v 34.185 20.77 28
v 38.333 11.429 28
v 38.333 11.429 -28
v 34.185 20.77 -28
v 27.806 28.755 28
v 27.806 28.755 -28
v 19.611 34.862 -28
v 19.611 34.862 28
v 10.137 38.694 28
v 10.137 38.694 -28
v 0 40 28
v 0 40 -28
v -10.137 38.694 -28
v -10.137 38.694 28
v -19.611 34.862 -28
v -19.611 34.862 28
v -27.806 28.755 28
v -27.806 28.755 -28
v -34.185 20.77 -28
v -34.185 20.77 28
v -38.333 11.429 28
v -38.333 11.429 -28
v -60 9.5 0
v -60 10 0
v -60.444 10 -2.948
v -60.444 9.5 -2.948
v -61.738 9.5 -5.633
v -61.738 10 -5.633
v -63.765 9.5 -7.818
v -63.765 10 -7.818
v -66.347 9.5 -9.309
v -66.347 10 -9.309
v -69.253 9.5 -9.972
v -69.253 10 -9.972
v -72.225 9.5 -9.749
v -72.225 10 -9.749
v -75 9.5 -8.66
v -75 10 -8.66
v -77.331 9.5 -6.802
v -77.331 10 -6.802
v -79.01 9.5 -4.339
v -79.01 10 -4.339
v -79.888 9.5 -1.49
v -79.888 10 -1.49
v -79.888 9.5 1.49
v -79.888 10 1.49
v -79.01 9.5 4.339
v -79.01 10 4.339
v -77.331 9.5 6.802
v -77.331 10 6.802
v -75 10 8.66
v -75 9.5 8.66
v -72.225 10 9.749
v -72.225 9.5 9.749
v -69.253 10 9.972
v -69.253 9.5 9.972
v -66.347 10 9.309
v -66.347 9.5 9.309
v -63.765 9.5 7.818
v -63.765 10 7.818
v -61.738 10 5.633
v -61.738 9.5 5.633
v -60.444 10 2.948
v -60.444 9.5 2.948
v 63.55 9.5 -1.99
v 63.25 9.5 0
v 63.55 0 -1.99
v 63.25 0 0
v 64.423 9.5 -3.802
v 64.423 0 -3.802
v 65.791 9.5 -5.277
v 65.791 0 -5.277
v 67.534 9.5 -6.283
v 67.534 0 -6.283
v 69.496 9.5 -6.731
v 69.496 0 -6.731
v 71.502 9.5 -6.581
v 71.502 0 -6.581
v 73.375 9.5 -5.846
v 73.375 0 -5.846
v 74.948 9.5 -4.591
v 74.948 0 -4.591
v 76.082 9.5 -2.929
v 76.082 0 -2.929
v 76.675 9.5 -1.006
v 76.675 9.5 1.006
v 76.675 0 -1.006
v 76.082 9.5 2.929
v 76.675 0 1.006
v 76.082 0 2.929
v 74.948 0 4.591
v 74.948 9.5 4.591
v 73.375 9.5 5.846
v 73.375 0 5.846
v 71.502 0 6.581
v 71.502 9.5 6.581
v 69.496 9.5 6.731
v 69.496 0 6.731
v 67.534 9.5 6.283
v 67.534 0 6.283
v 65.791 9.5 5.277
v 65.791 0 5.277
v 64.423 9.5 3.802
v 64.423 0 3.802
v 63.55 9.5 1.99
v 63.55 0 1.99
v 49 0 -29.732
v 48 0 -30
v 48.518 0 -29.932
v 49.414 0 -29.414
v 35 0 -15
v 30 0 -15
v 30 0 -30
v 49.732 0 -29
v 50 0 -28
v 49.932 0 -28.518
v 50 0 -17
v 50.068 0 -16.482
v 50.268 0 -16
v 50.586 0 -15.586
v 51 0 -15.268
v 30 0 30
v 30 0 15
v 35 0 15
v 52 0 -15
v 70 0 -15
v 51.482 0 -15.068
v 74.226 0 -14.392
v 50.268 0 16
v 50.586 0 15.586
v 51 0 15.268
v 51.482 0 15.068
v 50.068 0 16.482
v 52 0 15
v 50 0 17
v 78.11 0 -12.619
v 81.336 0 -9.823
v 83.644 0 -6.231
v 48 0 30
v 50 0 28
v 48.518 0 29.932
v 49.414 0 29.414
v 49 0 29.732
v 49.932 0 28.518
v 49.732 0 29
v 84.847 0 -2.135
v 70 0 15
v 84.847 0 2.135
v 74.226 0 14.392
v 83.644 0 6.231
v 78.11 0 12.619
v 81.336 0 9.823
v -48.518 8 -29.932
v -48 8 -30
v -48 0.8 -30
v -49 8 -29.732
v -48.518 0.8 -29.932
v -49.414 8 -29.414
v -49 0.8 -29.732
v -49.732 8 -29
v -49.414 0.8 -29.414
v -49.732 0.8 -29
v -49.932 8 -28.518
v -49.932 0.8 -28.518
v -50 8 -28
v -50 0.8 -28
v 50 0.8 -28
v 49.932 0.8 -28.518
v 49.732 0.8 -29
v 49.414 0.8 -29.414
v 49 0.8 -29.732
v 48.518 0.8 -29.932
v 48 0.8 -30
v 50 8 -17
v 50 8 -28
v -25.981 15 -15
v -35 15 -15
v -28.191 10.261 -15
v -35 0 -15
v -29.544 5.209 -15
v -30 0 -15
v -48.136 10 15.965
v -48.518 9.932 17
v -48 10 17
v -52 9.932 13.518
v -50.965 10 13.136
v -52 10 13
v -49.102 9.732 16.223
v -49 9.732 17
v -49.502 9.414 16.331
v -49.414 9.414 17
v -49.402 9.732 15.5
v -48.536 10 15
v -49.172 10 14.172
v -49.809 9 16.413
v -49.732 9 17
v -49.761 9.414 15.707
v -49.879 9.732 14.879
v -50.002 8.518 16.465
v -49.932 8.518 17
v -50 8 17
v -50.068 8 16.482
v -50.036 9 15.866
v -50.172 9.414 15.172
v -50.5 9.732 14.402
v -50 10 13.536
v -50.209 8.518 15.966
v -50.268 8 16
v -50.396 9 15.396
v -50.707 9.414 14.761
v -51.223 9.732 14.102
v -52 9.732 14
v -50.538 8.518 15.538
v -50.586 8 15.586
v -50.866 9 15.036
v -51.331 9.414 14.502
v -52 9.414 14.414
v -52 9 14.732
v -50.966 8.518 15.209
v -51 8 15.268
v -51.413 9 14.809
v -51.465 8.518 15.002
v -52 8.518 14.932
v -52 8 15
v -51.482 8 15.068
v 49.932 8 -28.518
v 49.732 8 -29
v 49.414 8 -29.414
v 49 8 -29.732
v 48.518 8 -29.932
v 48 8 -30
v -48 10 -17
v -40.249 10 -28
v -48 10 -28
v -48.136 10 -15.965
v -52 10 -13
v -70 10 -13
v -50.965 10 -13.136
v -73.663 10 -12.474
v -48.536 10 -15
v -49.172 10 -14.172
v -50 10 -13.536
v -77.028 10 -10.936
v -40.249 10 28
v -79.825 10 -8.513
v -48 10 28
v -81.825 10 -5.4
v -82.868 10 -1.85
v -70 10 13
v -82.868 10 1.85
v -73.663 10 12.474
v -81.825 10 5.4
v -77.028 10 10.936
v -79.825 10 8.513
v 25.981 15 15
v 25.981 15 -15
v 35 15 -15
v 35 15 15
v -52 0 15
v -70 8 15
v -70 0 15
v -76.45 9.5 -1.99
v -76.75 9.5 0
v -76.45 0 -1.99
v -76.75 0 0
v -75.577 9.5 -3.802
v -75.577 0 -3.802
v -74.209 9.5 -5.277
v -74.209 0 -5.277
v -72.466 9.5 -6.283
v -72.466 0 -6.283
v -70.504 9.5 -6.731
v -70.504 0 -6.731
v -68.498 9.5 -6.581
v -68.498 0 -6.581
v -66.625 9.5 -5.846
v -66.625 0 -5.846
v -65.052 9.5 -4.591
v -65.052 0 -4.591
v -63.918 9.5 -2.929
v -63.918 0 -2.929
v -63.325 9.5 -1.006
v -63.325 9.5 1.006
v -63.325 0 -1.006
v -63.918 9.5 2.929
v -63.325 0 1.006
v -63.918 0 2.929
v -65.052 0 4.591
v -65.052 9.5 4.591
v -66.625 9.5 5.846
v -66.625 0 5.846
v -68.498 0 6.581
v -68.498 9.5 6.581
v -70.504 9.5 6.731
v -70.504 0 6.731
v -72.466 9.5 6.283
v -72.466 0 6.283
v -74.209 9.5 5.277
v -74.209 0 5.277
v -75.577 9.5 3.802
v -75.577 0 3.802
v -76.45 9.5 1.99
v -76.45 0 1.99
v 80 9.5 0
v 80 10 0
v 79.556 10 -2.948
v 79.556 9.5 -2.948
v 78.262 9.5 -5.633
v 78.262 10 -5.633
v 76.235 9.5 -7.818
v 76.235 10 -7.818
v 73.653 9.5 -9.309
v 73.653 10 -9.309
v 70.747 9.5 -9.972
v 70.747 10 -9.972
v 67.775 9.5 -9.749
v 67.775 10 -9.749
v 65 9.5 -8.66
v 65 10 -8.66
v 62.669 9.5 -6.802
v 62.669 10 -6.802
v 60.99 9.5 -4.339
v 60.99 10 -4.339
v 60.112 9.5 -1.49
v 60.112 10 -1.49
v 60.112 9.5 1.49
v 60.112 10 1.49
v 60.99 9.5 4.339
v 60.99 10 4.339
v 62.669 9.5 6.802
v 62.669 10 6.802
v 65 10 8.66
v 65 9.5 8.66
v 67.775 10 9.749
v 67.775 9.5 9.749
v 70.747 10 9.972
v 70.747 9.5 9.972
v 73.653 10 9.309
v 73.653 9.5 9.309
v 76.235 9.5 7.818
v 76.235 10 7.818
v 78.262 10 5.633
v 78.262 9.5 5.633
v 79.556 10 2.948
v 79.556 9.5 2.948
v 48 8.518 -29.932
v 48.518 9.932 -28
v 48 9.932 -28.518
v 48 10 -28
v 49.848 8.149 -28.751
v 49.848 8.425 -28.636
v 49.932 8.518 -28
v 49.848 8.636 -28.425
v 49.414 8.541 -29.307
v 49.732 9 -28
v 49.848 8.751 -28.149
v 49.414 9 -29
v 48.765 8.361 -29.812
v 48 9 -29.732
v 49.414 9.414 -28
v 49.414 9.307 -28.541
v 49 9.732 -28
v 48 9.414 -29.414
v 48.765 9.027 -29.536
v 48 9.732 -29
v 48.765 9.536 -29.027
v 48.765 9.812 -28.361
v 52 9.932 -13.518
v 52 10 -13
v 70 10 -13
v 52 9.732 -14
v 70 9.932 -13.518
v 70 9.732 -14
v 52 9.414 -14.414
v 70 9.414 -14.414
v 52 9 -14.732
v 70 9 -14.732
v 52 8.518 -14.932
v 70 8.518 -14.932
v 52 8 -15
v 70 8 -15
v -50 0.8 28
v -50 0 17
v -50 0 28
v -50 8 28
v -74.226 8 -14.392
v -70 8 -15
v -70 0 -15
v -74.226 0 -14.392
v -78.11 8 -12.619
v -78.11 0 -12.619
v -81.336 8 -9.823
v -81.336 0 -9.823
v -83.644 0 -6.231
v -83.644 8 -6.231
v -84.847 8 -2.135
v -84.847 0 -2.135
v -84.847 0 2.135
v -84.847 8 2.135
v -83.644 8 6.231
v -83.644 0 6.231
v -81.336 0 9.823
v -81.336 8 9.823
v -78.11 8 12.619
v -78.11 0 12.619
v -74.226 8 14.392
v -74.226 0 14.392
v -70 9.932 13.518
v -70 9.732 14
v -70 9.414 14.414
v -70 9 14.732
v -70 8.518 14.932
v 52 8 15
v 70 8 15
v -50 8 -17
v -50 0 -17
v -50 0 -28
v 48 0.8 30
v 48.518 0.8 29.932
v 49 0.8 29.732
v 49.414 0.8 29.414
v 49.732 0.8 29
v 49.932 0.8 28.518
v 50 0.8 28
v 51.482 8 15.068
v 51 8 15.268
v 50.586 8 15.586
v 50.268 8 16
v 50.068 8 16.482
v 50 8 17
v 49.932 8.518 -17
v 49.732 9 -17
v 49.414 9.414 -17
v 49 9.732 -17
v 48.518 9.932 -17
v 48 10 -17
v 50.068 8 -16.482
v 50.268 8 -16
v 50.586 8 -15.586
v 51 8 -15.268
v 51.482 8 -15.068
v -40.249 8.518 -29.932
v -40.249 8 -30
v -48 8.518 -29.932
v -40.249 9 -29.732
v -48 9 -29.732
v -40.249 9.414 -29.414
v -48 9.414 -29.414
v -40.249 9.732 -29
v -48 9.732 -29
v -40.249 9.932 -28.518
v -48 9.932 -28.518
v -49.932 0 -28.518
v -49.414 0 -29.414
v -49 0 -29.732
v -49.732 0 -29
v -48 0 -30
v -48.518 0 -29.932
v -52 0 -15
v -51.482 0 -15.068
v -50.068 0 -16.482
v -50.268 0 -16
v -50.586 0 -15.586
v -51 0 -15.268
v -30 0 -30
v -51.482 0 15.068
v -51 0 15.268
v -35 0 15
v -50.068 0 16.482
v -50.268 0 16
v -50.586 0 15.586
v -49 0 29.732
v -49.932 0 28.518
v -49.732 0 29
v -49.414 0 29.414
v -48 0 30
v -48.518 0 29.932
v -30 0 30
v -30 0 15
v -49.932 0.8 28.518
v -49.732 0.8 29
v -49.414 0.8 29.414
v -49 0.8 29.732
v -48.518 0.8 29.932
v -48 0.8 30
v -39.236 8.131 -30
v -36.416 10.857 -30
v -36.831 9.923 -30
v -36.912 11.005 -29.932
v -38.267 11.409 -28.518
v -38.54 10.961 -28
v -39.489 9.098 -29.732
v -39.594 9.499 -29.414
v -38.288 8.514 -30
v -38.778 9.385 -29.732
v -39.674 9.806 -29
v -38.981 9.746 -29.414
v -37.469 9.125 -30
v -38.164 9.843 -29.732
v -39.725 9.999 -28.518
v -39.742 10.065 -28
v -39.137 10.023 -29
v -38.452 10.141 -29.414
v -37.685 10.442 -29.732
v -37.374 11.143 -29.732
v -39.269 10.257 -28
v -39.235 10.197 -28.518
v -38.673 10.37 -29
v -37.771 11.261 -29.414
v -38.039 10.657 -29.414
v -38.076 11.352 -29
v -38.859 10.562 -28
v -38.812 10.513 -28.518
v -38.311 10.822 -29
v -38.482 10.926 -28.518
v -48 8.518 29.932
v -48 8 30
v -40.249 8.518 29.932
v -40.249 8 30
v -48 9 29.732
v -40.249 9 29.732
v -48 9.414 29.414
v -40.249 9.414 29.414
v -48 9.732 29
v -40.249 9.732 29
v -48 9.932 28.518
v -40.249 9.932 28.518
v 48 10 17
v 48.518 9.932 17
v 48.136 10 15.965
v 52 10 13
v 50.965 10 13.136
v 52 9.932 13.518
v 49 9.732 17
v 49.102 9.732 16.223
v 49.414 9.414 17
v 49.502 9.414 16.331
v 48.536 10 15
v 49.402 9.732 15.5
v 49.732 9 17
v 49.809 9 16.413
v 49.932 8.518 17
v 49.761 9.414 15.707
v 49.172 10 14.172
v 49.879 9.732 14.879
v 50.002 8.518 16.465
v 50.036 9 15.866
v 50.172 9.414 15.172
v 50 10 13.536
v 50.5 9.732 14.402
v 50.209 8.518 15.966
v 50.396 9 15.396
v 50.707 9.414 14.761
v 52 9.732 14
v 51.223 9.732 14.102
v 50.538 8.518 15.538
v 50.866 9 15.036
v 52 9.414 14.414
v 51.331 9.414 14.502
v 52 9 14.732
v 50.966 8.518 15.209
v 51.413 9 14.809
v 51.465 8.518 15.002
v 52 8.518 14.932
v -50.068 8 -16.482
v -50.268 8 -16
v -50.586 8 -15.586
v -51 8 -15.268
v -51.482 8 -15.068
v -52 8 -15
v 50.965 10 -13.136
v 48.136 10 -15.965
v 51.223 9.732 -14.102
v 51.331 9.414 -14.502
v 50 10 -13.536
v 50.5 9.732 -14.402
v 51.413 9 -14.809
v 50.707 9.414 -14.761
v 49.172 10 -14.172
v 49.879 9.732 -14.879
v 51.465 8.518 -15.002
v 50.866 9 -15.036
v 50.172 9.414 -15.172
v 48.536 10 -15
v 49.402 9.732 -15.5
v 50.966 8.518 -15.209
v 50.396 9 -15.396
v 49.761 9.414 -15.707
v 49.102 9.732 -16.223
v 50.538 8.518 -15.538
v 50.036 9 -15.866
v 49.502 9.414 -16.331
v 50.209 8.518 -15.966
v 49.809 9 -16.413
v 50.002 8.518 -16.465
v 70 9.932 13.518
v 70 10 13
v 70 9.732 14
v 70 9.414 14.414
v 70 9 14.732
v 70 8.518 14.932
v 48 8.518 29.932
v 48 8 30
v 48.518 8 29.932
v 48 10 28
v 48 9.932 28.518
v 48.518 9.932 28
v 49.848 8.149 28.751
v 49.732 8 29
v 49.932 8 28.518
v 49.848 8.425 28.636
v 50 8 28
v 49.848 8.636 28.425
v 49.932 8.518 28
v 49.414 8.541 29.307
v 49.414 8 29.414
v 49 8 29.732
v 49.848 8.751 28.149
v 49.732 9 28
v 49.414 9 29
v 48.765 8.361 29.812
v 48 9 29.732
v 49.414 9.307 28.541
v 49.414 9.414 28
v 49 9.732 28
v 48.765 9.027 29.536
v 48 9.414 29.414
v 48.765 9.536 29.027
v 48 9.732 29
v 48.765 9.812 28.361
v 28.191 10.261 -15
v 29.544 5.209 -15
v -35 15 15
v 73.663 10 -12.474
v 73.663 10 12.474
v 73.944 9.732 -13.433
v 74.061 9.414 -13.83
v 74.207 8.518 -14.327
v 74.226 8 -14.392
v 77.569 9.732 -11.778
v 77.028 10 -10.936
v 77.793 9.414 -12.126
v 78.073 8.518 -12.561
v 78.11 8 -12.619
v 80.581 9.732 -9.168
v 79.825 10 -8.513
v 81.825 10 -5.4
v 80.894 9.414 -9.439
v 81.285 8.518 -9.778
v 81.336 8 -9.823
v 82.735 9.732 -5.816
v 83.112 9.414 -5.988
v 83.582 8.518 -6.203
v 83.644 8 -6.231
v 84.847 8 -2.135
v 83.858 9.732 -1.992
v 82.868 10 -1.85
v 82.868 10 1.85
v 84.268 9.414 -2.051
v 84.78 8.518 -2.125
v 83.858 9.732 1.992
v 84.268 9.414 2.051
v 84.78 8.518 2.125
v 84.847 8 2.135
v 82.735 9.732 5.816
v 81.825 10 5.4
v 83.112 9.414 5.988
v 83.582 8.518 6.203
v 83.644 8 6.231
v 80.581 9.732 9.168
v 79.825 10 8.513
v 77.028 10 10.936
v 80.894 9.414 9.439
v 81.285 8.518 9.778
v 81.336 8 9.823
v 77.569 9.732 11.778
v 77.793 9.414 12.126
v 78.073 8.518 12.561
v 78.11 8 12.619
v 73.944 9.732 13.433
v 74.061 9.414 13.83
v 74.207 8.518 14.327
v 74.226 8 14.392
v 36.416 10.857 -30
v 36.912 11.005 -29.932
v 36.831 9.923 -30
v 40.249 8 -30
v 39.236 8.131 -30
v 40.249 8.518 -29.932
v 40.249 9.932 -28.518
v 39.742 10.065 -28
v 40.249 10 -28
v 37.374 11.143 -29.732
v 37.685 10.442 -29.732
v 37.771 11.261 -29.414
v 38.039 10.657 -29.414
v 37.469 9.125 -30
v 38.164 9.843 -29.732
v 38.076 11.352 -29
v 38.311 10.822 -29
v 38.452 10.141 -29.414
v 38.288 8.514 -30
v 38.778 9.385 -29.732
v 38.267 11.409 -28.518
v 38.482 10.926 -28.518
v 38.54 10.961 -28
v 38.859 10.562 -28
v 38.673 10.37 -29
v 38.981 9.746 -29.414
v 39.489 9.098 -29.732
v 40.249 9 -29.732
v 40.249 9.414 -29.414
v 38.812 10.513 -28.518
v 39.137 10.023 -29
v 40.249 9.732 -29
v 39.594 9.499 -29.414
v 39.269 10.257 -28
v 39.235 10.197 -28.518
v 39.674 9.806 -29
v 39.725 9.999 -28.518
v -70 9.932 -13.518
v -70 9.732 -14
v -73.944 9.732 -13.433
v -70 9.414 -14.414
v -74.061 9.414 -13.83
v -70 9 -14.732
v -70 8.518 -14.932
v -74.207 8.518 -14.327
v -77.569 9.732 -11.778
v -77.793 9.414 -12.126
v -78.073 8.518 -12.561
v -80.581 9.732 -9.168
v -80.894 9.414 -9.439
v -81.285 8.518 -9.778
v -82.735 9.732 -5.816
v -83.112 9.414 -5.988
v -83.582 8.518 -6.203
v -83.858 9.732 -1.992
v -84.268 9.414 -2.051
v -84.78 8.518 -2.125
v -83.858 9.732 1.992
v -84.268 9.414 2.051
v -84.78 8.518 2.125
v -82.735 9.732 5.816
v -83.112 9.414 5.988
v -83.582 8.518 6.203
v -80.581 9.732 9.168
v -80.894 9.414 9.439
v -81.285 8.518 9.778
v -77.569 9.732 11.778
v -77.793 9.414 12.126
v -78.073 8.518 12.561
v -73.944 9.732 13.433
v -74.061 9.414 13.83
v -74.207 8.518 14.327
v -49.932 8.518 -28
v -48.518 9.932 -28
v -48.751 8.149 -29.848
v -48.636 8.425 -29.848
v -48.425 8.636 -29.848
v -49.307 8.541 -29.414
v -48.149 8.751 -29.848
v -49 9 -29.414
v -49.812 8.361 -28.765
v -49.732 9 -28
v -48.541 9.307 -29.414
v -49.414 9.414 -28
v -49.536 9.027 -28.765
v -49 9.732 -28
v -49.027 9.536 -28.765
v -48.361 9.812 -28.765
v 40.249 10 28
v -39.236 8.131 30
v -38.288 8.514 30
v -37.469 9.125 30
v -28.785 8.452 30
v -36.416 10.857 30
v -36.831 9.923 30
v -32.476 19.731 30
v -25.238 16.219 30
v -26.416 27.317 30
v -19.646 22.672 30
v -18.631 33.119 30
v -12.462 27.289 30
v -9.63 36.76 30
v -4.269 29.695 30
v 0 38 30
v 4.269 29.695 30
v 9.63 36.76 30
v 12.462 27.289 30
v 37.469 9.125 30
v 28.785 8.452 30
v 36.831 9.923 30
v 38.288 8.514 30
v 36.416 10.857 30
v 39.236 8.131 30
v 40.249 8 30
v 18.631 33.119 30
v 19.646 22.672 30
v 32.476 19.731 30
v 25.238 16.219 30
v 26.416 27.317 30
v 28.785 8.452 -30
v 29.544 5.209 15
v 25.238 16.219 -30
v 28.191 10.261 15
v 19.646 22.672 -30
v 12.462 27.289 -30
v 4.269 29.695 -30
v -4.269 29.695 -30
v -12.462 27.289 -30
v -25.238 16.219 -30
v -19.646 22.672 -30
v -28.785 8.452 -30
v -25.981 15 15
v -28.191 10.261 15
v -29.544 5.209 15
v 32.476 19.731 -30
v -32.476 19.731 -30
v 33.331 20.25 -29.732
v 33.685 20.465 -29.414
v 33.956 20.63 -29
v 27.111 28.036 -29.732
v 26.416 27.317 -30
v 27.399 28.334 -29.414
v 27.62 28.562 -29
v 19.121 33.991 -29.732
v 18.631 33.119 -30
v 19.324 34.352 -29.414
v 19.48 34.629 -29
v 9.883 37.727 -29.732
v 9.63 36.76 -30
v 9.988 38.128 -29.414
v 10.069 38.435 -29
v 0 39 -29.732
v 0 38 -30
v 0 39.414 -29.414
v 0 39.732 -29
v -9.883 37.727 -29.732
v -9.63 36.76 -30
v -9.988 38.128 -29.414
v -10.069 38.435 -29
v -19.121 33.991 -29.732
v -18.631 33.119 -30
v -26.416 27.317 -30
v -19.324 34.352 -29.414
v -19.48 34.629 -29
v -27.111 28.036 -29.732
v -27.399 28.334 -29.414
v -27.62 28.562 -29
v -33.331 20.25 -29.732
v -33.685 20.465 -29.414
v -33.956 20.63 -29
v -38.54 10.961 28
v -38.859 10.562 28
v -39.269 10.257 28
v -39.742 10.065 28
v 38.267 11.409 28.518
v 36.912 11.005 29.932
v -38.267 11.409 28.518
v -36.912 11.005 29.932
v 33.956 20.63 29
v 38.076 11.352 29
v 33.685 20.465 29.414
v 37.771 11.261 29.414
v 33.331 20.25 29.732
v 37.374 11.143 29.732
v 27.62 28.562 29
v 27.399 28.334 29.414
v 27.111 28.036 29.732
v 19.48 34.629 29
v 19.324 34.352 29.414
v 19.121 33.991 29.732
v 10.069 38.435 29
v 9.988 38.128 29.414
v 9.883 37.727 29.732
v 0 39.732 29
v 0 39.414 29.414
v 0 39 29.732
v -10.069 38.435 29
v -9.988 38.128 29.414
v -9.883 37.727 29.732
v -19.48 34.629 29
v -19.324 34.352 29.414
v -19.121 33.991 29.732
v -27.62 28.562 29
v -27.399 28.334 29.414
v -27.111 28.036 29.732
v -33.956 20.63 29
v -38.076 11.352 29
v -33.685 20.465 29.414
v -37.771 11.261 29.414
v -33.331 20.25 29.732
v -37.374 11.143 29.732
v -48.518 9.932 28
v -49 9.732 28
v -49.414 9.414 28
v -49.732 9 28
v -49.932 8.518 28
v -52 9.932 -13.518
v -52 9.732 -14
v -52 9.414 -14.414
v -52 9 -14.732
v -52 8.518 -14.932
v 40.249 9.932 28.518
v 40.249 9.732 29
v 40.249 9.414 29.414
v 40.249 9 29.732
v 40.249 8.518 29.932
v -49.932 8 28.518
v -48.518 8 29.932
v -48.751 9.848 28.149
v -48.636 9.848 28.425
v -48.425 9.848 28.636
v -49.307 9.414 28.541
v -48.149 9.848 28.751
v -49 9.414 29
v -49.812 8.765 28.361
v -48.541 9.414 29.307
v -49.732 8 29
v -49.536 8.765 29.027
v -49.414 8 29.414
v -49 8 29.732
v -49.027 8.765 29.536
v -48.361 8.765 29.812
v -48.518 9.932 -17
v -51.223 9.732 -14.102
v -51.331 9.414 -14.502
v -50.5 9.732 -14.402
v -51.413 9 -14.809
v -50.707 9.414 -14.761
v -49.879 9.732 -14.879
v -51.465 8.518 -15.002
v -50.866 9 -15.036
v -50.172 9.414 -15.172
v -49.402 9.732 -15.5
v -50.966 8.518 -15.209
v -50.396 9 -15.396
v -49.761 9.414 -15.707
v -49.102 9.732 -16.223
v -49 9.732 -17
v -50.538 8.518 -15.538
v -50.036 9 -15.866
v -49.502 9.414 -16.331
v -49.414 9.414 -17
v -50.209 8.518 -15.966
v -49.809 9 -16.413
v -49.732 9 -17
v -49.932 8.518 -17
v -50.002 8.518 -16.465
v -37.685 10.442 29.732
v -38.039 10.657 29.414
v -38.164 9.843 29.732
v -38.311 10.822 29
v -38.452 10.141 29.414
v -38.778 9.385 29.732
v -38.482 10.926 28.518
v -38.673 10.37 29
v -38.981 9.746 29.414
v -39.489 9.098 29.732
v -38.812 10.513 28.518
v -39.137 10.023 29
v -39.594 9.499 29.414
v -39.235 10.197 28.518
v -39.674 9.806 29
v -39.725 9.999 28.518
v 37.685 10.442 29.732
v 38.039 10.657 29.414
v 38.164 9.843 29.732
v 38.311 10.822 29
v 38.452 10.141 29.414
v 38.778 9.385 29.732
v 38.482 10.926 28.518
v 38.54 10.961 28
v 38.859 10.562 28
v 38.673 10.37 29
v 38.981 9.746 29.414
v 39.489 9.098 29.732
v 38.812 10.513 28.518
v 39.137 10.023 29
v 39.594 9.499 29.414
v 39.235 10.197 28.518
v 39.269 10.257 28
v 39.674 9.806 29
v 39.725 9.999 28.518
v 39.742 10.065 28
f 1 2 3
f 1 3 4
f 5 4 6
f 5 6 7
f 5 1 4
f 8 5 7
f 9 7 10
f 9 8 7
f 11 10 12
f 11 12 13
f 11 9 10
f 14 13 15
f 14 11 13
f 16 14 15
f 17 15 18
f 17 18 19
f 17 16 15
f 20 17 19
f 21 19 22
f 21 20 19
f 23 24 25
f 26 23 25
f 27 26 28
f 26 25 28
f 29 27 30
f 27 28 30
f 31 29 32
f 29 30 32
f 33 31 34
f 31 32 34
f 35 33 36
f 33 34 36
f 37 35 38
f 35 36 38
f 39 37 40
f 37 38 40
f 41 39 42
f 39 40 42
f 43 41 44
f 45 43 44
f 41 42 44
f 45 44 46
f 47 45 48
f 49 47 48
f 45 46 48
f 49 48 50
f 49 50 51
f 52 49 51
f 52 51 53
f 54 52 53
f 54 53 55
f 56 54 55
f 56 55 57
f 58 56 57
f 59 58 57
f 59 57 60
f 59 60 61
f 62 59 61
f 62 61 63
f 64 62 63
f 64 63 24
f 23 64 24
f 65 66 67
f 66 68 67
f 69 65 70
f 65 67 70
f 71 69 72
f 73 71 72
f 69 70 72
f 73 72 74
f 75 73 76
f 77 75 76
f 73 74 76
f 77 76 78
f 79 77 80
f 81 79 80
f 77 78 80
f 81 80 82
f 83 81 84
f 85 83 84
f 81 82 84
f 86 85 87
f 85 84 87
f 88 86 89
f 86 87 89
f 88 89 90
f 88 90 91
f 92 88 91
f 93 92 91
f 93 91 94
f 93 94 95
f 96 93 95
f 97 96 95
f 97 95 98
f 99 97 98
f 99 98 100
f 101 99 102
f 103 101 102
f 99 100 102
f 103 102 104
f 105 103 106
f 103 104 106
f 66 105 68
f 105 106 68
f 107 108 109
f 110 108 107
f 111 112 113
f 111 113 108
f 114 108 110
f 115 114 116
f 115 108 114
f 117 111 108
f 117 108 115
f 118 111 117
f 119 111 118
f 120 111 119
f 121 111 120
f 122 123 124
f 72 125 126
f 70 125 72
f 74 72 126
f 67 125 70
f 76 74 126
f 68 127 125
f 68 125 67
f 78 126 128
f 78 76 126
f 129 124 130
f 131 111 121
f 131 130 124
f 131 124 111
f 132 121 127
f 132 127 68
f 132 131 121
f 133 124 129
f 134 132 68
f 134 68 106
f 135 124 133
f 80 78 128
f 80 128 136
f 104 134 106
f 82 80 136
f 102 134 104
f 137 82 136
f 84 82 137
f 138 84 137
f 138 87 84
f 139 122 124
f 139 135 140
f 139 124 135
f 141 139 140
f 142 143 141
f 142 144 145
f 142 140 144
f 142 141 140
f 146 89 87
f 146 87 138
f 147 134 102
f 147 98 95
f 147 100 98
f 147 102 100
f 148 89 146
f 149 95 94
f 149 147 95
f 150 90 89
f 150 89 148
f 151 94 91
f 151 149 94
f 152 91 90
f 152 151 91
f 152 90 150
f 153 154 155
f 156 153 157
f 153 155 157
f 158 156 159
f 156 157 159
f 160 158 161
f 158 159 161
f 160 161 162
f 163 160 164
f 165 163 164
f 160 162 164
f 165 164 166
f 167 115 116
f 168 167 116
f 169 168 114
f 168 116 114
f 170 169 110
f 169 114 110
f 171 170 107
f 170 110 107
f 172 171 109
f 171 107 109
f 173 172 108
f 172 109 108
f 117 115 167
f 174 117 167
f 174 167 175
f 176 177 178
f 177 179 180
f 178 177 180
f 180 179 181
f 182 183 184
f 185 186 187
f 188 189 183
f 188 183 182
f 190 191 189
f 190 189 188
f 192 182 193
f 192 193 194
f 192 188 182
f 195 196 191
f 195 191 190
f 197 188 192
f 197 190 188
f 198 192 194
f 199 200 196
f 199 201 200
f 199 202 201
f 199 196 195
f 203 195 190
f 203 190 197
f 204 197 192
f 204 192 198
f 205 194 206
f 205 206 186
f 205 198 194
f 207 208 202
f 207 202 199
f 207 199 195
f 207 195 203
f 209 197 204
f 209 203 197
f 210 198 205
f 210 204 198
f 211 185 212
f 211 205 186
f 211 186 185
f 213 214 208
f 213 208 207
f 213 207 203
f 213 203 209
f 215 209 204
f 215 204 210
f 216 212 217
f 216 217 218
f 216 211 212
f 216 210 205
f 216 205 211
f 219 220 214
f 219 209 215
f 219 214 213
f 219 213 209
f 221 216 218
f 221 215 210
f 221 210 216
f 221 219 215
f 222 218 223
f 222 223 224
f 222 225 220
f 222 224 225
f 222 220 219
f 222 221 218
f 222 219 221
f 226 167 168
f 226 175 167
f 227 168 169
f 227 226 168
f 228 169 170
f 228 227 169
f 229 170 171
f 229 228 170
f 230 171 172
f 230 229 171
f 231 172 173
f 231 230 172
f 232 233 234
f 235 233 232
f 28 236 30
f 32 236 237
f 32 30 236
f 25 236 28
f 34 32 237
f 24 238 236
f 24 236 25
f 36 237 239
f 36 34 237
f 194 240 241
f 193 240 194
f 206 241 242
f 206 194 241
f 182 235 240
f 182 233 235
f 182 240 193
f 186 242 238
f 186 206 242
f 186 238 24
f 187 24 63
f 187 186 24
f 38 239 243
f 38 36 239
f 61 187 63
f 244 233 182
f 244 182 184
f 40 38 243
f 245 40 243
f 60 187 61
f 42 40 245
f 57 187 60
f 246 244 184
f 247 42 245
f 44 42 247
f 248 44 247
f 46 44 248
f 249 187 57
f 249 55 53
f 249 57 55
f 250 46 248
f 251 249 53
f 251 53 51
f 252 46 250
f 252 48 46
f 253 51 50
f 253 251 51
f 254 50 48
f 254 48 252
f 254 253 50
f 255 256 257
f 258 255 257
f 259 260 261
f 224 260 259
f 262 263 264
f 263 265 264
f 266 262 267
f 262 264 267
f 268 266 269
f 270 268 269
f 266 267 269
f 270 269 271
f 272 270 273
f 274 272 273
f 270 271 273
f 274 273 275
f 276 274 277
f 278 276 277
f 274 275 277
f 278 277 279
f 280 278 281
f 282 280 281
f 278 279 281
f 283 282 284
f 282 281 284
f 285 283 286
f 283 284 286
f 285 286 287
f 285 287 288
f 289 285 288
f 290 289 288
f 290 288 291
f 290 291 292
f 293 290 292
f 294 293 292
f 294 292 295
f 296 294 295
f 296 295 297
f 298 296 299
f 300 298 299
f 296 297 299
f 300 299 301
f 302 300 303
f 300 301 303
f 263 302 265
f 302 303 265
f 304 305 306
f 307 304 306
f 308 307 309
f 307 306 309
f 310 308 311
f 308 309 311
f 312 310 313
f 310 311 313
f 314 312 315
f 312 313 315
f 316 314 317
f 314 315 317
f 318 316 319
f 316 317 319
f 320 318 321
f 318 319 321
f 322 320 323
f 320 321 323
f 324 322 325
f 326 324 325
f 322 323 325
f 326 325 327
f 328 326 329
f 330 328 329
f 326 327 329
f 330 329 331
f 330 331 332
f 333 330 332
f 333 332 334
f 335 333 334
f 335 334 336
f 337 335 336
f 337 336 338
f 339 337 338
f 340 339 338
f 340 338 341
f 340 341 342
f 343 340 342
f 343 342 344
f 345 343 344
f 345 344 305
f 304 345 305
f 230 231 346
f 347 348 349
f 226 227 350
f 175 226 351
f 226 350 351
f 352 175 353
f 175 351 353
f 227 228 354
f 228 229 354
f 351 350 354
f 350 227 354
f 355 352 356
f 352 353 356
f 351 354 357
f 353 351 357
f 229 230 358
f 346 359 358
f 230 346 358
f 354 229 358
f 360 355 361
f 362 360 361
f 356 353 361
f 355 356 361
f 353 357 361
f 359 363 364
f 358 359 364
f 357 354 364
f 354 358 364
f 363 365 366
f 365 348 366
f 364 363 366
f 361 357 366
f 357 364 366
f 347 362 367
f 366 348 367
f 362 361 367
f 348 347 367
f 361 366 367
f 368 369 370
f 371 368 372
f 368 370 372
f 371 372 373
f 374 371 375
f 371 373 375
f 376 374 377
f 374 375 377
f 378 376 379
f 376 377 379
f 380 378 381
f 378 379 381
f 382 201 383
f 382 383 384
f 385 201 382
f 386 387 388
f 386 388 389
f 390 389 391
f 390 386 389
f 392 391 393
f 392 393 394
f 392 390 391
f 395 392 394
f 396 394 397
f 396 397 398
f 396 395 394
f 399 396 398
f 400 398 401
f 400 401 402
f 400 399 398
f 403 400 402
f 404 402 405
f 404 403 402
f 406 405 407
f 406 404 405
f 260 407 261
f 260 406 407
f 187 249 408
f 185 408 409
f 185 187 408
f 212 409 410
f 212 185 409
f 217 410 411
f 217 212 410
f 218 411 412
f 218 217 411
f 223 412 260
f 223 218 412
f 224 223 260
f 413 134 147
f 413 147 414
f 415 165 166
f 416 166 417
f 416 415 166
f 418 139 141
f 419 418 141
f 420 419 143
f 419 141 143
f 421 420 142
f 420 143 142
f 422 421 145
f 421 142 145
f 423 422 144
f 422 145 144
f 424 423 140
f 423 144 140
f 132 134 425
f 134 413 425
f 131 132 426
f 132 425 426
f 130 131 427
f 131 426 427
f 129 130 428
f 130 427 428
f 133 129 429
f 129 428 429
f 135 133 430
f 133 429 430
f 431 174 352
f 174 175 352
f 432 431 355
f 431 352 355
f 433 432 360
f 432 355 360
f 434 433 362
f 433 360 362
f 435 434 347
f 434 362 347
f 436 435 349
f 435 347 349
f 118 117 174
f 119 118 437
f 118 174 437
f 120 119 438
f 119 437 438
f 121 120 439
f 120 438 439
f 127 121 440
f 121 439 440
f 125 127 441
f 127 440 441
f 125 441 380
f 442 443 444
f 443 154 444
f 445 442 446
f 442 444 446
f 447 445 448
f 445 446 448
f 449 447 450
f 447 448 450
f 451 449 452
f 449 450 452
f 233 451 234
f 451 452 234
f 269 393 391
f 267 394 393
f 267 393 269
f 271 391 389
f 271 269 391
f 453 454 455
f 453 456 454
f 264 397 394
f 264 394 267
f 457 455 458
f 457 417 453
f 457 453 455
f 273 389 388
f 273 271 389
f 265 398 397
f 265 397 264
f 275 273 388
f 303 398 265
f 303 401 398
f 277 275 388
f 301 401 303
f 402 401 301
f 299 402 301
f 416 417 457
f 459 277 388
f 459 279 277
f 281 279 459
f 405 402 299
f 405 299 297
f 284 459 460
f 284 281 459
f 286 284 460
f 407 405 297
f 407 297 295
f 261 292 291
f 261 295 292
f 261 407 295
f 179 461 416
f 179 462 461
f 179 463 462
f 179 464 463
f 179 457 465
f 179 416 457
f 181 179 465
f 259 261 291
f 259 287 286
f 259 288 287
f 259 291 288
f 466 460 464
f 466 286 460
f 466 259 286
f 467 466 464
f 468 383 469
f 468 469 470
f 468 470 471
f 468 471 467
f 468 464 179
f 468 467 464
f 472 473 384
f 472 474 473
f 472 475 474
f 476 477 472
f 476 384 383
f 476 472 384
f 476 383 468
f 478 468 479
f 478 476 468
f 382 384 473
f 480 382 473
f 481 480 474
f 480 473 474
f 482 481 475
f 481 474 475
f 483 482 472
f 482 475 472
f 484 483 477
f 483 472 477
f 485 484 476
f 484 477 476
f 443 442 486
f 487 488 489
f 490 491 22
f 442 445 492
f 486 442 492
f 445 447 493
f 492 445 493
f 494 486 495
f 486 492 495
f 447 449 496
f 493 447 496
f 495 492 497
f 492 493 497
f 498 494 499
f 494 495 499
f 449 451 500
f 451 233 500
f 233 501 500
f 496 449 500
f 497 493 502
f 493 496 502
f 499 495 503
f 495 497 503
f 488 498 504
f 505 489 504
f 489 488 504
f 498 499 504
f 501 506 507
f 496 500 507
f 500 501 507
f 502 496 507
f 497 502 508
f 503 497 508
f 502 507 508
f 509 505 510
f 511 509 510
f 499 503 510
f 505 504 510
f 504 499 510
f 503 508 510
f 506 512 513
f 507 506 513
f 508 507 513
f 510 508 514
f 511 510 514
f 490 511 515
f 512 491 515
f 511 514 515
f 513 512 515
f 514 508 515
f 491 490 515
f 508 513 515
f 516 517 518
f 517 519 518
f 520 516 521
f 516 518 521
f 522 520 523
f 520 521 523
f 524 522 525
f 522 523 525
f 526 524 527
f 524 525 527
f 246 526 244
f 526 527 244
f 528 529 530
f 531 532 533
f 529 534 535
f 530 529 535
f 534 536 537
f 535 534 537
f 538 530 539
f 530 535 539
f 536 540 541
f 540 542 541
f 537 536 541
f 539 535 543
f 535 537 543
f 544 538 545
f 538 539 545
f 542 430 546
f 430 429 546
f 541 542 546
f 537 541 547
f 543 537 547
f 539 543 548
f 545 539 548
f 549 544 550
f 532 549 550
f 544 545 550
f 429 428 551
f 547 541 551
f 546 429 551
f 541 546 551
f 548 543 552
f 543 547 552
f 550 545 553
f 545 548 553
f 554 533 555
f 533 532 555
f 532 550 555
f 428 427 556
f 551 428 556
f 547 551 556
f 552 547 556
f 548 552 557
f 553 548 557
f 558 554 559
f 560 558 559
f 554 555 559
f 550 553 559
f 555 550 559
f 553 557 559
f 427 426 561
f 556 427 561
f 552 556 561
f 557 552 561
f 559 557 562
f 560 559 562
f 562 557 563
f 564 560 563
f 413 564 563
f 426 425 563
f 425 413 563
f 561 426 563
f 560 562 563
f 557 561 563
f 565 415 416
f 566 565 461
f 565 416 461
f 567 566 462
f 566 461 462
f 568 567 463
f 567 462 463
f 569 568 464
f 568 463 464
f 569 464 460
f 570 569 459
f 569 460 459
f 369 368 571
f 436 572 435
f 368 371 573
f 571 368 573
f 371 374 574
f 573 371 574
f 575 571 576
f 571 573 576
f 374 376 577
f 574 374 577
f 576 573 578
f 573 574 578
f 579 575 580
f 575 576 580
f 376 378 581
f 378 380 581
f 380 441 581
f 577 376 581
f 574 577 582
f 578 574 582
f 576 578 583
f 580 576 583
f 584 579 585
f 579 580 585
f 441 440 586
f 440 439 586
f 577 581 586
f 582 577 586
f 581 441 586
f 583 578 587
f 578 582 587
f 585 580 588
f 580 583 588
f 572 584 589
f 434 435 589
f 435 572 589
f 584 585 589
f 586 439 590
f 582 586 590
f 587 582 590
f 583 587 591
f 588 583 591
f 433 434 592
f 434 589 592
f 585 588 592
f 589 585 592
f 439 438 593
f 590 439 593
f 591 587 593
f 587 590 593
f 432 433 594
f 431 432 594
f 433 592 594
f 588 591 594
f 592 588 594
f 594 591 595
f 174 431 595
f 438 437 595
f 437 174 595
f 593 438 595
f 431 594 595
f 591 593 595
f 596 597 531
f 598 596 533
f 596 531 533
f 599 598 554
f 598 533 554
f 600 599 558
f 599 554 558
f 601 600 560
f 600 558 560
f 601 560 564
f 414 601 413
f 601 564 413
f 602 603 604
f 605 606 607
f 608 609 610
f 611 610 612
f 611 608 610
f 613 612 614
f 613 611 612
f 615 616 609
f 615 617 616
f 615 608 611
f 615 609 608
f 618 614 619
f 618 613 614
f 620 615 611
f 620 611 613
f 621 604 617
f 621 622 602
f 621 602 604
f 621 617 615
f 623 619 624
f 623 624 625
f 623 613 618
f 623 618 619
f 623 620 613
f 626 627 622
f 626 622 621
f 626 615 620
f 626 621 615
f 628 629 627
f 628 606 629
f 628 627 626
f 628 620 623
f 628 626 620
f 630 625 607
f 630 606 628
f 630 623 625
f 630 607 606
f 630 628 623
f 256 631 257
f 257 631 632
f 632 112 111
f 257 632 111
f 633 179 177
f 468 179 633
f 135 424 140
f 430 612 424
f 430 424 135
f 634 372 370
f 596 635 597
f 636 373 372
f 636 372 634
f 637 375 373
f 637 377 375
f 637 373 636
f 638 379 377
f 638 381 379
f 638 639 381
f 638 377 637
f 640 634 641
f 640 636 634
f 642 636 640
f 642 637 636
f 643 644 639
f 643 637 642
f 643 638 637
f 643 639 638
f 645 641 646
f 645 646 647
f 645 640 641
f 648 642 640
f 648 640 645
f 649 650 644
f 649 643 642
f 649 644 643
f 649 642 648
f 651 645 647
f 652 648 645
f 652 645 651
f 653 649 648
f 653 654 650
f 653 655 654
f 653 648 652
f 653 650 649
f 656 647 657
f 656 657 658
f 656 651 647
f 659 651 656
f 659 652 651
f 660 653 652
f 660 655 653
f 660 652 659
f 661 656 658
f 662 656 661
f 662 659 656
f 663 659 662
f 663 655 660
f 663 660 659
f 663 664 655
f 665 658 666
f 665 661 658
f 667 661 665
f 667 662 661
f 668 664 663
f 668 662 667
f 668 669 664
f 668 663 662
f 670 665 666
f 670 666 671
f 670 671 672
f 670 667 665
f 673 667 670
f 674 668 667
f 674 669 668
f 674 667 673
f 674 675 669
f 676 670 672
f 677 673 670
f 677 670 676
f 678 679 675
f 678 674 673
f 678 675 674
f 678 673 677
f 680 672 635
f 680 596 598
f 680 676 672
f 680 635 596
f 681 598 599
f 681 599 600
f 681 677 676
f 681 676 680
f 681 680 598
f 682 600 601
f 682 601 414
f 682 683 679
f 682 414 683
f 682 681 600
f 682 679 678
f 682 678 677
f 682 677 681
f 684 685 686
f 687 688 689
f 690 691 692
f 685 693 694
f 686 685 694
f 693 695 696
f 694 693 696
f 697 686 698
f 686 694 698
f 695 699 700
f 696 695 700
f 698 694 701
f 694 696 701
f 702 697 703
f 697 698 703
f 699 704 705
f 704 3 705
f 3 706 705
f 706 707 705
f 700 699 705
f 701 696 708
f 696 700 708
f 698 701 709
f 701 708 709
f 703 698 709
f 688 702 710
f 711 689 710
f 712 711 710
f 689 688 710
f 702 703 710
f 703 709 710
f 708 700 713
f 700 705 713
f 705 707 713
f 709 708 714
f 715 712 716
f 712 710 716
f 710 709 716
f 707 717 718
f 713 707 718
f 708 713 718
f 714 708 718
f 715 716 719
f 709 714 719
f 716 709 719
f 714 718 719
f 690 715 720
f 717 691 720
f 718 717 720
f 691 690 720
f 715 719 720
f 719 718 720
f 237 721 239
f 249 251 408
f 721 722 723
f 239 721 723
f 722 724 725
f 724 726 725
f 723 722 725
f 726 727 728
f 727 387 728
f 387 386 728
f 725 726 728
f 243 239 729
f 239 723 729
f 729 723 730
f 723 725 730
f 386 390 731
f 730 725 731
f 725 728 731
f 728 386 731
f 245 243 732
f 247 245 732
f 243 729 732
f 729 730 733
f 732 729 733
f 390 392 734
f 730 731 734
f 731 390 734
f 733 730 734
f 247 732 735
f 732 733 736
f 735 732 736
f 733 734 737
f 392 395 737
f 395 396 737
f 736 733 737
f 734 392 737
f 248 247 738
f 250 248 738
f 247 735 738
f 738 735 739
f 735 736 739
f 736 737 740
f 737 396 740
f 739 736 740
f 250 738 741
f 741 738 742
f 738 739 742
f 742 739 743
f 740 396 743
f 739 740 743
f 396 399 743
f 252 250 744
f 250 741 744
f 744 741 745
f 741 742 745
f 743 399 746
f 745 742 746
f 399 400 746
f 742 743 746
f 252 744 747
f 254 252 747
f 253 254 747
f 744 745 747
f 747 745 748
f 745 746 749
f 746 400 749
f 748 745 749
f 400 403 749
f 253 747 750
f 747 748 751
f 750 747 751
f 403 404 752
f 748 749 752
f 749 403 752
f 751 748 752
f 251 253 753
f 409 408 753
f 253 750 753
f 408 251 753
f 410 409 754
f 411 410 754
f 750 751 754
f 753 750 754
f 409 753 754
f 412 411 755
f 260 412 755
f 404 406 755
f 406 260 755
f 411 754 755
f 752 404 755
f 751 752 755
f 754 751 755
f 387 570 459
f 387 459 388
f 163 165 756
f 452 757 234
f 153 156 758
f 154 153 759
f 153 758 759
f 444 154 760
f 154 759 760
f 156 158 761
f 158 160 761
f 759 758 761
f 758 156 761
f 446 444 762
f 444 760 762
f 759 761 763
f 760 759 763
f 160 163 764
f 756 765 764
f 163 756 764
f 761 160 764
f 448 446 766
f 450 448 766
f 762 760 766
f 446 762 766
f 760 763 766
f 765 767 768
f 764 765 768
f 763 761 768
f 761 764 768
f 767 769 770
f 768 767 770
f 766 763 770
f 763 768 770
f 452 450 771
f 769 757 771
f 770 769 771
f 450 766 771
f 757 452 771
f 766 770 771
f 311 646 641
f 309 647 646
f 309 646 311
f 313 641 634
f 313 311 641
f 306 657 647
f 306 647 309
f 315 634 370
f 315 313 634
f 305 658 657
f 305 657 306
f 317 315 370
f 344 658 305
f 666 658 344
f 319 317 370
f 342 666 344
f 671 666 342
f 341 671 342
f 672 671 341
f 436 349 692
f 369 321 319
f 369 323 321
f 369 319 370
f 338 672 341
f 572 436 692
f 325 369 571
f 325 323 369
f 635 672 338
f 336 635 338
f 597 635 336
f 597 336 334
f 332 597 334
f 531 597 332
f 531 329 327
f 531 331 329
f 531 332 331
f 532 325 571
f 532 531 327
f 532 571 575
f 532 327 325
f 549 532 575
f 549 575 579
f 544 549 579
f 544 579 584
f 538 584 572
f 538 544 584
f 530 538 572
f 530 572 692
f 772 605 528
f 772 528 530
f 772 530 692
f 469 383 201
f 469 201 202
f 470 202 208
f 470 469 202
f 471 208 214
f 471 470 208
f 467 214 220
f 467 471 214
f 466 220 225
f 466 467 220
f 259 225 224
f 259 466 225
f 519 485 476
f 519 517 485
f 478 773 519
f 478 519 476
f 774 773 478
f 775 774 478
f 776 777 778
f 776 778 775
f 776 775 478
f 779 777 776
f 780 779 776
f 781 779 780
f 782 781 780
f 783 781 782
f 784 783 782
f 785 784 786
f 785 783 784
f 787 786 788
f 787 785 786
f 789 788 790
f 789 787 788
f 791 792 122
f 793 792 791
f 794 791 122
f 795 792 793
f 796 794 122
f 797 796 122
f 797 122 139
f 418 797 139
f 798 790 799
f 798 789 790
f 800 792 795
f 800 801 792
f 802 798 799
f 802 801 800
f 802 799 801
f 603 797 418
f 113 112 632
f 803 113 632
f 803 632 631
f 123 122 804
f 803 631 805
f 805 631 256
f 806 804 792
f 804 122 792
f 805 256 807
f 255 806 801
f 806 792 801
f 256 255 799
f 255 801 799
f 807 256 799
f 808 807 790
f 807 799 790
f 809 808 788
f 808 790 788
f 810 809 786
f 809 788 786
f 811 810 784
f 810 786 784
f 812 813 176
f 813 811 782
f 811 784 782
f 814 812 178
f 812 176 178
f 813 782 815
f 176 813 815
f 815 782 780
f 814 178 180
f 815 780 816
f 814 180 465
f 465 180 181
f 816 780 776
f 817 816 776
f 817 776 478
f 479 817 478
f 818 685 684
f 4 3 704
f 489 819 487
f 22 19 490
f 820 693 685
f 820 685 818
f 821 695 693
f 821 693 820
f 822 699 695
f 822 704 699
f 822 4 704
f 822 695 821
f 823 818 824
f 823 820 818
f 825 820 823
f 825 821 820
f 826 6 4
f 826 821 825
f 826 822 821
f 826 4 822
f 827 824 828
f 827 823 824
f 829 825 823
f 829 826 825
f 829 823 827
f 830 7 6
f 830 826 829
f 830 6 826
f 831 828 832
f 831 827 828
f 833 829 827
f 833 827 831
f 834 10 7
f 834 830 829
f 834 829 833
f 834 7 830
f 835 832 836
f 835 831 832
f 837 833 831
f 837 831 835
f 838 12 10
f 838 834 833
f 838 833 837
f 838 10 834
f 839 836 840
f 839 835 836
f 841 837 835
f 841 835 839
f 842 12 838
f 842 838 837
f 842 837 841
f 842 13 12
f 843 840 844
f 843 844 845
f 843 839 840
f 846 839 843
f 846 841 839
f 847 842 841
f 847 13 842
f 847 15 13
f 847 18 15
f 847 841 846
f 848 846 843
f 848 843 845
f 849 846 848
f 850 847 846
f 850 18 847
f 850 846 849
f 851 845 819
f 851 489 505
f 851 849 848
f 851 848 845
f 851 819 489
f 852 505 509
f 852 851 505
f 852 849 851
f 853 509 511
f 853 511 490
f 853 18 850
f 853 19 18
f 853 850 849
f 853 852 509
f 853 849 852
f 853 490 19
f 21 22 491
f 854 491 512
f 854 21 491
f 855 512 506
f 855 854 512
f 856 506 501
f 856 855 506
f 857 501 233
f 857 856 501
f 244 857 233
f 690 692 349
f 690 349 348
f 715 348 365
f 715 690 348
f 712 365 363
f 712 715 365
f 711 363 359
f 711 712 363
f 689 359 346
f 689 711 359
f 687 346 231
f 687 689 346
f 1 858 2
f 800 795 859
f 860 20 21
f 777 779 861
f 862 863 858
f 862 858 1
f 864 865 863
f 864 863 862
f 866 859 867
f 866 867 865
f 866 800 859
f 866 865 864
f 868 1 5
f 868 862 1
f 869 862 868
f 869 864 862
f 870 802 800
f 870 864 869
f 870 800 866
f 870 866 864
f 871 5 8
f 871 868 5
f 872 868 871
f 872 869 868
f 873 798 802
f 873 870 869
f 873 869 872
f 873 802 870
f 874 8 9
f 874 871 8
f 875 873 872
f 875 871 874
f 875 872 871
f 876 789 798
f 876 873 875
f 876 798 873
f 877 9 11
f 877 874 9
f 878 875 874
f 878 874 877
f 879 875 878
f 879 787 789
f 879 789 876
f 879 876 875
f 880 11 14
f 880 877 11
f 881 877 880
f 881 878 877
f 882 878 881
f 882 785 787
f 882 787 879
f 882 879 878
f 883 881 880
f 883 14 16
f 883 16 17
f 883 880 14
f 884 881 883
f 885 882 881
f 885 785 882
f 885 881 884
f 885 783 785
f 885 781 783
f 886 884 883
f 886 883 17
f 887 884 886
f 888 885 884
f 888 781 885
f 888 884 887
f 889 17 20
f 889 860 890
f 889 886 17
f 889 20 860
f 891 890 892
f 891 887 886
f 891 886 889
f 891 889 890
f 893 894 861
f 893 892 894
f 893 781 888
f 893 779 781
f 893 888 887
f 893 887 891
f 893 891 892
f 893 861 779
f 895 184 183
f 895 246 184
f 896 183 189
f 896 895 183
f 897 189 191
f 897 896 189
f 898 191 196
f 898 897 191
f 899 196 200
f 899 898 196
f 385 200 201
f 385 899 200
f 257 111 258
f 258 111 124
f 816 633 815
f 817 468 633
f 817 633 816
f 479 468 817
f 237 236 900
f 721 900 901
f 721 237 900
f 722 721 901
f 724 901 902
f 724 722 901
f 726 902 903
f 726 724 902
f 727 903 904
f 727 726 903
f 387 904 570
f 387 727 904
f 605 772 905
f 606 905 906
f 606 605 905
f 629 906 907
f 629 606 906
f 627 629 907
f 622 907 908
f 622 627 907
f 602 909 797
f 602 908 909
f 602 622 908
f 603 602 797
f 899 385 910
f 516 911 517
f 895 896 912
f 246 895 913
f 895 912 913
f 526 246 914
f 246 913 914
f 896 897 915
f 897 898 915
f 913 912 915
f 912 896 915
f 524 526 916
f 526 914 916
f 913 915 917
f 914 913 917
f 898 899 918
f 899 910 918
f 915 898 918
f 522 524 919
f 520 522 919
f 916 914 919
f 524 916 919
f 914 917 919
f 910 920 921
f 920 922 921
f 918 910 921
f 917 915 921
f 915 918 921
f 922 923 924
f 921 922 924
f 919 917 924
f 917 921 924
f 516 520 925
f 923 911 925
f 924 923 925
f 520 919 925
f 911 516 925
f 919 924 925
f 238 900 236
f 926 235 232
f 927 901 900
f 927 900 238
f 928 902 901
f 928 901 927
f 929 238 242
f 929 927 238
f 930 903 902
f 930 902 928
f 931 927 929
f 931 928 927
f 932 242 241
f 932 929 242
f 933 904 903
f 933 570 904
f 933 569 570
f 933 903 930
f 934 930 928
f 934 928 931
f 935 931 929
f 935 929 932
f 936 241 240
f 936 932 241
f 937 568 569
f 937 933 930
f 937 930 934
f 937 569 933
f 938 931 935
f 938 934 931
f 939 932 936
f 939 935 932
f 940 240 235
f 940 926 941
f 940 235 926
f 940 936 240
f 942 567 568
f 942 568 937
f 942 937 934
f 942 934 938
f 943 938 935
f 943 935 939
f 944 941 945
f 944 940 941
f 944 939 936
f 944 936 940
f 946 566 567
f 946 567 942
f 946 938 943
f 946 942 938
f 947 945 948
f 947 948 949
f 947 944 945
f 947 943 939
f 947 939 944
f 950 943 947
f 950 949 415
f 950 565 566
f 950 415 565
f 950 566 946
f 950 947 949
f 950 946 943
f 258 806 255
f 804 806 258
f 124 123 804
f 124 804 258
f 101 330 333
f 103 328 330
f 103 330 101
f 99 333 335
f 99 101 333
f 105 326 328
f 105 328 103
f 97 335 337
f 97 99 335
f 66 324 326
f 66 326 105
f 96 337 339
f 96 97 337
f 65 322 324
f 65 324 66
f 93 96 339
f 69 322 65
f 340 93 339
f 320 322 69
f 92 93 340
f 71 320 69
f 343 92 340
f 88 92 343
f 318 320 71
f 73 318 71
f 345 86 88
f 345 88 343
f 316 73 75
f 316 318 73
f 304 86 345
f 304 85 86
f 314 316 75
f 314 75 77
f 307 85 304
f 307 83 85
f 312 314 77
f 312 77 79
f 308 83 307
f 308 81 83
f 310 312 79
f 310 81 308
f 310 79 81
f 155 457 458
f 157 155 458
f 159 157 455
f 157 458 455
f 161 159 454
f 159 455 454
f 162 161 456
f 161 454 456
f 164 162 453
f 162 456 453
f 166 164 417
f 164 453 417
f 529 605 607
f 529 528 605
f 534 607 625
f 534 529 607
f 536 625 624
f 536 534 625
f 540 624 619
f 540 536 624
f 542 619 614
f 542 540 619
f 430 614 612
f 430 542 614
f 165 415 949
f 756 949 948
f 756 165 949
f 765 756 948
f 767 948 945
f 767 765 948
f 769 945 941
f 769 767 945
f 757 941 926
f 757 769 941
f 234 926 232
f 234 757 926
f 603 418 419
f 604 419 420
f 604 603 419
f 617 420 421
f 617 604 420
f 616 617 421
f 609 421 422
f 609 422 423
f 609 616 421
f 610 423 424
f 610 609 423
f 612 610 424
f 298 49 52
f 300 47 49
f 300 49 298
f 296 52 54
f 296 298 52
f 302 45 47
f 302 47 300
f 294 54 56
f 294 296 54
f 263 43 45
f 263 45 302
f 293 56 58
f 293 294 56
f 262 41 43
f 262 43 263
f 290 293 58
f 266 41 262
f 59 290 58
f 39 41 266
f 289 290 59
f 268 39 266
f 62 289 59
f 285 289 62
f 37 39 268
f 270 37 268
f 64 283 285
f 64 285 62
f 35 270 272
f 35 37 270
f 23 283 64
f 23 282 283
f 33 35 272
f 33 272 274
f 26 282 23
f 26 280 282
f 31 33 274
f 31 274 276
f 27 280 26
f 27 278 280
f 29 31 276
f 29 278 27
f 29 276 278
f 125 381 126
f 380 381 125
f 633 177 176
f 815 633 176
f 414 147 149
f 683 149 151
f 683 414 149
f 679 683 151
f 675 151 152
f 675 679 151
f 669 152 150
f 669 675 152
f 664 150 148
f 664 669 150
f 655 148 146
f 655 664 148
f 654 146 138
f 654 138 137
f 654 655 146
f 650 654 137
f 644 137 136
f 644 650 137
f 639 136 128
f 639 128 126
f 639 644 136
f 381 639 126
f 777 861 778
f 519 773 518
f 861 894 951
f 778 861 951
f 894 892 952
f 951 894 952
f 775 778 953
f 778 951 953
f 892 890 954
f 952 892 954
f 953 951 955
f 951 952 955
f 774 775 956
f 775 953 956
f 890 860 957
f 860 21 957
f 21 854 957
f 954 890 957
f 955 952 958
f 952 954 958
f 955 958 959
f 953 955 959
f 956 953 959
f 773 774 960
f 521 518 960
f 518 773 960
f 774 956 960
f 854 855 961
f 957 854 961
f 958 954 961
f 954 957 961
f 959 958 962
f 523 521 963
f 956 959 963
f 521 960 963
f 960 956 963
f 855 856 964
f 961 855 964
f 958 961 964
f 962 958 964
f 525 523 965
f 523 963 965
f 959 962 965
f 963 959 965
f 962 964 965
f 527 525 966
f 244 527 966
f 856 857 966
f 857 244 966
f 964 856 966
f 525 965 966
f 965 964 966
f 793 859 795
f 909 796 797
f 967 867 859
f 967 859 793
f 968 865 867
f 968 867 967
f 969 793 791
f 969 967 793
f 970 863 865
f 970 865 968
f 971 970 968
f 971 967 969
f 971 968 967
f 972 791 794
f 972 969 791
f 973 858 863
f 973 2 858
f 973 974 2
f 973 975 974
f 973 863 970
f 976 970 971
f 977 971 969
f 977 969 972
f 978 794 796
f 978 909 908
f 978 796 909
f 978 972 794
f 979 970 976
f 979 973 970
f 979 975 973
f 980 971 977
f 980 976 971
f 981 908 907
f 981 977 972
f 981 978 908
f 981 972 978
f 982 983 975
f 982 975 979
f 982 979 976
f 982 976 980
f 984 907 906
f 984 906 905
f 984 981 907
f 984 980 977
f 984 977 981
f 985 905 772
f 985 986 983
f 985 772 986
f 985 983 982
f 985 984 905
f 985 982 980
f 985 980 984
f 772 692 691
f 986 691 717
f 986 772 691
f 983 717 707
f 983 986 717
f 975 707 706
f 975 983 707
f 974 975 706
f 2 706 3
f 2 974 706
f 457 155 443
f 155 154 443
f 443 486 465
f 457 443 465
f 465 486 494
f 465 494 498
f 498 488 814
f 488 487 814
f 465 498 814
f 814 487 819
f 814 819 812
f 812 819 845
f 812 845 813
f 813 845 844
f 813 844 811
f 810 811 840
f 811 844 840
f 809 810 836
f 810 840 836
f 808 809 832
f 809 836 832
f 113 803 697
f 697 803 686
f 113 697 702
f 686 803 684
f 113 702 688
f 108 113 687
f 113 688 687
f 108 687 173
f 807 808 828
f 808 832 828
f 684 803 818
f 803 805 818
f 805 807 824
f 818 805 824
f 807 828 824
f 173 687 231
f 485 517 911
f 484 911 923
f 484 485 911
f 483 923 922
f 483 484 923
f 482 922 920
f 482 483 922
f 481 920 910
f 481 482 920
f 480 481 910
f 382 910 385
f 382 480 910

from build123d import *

# Parameters (mm, degrees)
EXTRUDE_1_DEPTH               = 45
EXTRUDE_2_DEPTH               = 10
SKETCH_3_W                    = 15
SKETCH_3_H                    = 10
CUT_EXTRUDE_1_DEPTH           = 20.000000002
EXTRUDE_3_DEPTH               = 15
CUT_EXTRUDE_2_DEPTH           = 0.8
CUT_EXTRUDE_3_DEPTH           = 0.8
CUT_EXTRUDE_4_DEPTH           = 0.8
CUT_EXTRUDE_5_DEPTH           = 0.8
SKETCH_9_W                    = 70.000000048
SKETCH_9_H                    = 30
CUT_EXTRUDE_6_DEPTH           = 15
HOLE_WIZARD_M52_1_D           = 60
HOLE_WIZARD_M12_1_D           = 13.5
HOLE_WIZARD_M12_1_CBORE_D     = 20
HOLE_WIZARD_M12_1_CBORE_DEPTH = 0.5
FILLET_1_R                    = 2


with BuildPart() as part:
    # 草图1 → 凸台-拉伸1 (new body)
    with BuildSketch(Plane.XY.offset(30)):
        with BuildLine():
            Line((-38.729833462, 10), (38.729833462, 10))
            ThreePointArc((38.729833462, 10), (0, 40), (-38.729833462, 10))
        make_face()
    extrude(amount=-EXTRUDE_1_DEPTH)

    # 草图2 → 凸台-拉伸2 (add)
    with BuildSketch(Plane.XZ.offset(-10)):
        with BuildLine():
            Line((-70, 15), (-50, 15))
            Line((-50, 15), (-50, 30))
            Line((-50, 30), (70, 30))
            Line((70, 30), (70, 15))
            ThreePointArc((70, 15), (85, 0), (70, -15))
            Line((70, -15), (-70, -15))
            ThreePointArc((-70, -15), (-85, 0), (-70, 15))
        make_face()
    extrude(amount=EXTRUDE_2_DEPTH)

    # 草图3 → 切除-拉伸1 (cut)
    with BuildSketch(Plane(origin=(70, 0, 0), x_dir=(0, 0, -1), z_dir=(1, 0, 0))):
        with Locations((-22.5, 5)):
            Rectangle(SKETCH_3_W, SKETCH_3_H)
    extrude(amount=-CUT_EXTRUDE_1_DEPTH, mode=Mode.SUBTRACT)

    # 草图4 → 凸台-拉伸3 (add)
    with BuildSketch(Plane(origin=(0, 0, -15), x_dir=(-1, 0, 0), z_dir=(0, 0, -1))):
        with BuildLine():
            Line((-50, 0), (-50, 10))
            Line((-50, 10), (-38.729833462, 10))
            ThreePointArc((-38.729833462, 10), (0, 40), (38.729833462, 10))
            Line((38.729833462, 10), (50, 10))
            Line((50, 10), (50, 0))
            Line((50, 0), (-50, 0))
        make_face()
    extrude(amount=EXTRUDE_3_DEPTH)

    # 草图5 → 切除-拉伸2 (cut)
    with BuildSketch(Plane.XZ):
        with BuildLine():
            Line((49.999999992, 28), (49.999999992, 29.999999996))
            Line((49.999999992, 29.999999996), (47.999999996, 29.999999996))
            ThreePointArc((47.999999996, 29.999999996), (49.414213556, 29.41421356), (49.999999992, 28))
        make_face()
    extrude(amount=-CUT_EXTRUDE_2_DEPTH, mode=Mode.SUBTRACT)

    # 草图6 → 切除-拉伸3 (cut)
    with BuildSketch(Plane.XZ):
        with BuildLine():
            Line((-48.000000004, 29.999999996), (-50, 29.999999996))
            Line((-50, 29.999999996), (-50, 28))
            ThreePointArc((-50, 28), (-49.414213564, 29.41421356), (-48.000000004, 29.999999996))
        make_face()
    extrude(amount=-CUT_EXTRUDE_3_DEPTH, mode=Mode.SUBTRACT)

    # 草图7 → 切除-拉伸4 (cut)
    with BuildSketch(Plane.XZ):
        with BuildLine():
            Line((48, -30), (49.999999996, -30))
            Line((49.999999996, -30), (49.999999996, -28.000000004))
            ThreePointArc((49.999999996, -28.000000004), (49.41421356, -29.414213564), (48, -30))
        make_face()
    extrude(amount=-CUT_EXTRUDE_4_DEPTH, mode=Mode.SUBTRACT)

    # 草图8 → 切除-拉伸5 (cut)
    with BuildSketch(Plane.XZ):
        with BuildLine():
            Line((-49.999999996, -28.000000004), (-49.999999996, -30))
            Line((-49.999999996, -30), (-48, -30))
            ThreePointArc((-48, -30), (-49.41421356, -29.414213564), (-49.999999996, -28.000000004))
        make_face()
    extrude(amount=-CUT_EXTRUDE_5_DEPTH, mode=Mode.SUBTRACT)

    # 草图9 → 切除-拉伸6 (cut)
    with BuildSketch(Plane.XZ):
        Rectangle(SKETCH_9_W, SKETCH_9_H)
    extrude(amount=-CUT_EXTRUDE_6_DEPTH, mode=Mode.SUBTRACT)

    # M52 间隙孔1 (through all)
    with Locations(Plane(origin=(0, 0, -30), x_dir=(-1, 0, 0), z_dir=(0, 0, -1))):
        with Locations((0, 0)):
            Hole(HOLE_WIZARD_M52_1_D / 2)

    # M12 六角头螺栓的柱形沉头孔1 (through all)
    with Locations(Plane(origin=(0, 10, 0), x_dir=(1, 0, 0), z_dir=(0, 1, 0))):
        with Locations((-70, 0), (70, 0)):
            CounterBoreHole(HOLE_WIZARD_M12_1_D / 2, HOLE_WIZARD_M12_1_CBORE_D / 2, HOLE_WIZARD_M12_1_CBORE_DEPTH)

    # 圆角1
    fillet_1_edges = [part.edges().sort_by_distance(p)[0] for p in [
        (-50, 5.4, 30),
        (-50, 10, 22.5),
        (-60, 10, 15),
        (-85, 10, 0),
        (-60, 10, -15),
        (-50, 10, -22.5),
        (-50, 5.4, -30),
        (-44.364916731, 10, 30),
        (38.729833462, 10, 0),
        (-38.729833462, 10, 0),
        (0, 40, 30),
        (44.36491673, 10, 30),
        (-44.364916731, 10, -30),
        (0, 40, -30),
        (44.364916731, 10, -30),
        (49.999999998, 5.4, 30),
        (50, 5.4, -30),
        (49.999999998, 10, 22.5),
        (59.999999999, 10, 15),
        (85, 10, 0),
        (50, 10, -22.5),
        (60, 10, -15),
        (50, 5, -15),
        (-50, 5, -15),
        (-50, 5, 15),
        (49.999999998, 5, 15),
    ]]
    fillet(fillet_1_edges, radius=FILLET_1_R - 0.0001)  # a hair under: the kernel refuses the full size


solid = part.part
